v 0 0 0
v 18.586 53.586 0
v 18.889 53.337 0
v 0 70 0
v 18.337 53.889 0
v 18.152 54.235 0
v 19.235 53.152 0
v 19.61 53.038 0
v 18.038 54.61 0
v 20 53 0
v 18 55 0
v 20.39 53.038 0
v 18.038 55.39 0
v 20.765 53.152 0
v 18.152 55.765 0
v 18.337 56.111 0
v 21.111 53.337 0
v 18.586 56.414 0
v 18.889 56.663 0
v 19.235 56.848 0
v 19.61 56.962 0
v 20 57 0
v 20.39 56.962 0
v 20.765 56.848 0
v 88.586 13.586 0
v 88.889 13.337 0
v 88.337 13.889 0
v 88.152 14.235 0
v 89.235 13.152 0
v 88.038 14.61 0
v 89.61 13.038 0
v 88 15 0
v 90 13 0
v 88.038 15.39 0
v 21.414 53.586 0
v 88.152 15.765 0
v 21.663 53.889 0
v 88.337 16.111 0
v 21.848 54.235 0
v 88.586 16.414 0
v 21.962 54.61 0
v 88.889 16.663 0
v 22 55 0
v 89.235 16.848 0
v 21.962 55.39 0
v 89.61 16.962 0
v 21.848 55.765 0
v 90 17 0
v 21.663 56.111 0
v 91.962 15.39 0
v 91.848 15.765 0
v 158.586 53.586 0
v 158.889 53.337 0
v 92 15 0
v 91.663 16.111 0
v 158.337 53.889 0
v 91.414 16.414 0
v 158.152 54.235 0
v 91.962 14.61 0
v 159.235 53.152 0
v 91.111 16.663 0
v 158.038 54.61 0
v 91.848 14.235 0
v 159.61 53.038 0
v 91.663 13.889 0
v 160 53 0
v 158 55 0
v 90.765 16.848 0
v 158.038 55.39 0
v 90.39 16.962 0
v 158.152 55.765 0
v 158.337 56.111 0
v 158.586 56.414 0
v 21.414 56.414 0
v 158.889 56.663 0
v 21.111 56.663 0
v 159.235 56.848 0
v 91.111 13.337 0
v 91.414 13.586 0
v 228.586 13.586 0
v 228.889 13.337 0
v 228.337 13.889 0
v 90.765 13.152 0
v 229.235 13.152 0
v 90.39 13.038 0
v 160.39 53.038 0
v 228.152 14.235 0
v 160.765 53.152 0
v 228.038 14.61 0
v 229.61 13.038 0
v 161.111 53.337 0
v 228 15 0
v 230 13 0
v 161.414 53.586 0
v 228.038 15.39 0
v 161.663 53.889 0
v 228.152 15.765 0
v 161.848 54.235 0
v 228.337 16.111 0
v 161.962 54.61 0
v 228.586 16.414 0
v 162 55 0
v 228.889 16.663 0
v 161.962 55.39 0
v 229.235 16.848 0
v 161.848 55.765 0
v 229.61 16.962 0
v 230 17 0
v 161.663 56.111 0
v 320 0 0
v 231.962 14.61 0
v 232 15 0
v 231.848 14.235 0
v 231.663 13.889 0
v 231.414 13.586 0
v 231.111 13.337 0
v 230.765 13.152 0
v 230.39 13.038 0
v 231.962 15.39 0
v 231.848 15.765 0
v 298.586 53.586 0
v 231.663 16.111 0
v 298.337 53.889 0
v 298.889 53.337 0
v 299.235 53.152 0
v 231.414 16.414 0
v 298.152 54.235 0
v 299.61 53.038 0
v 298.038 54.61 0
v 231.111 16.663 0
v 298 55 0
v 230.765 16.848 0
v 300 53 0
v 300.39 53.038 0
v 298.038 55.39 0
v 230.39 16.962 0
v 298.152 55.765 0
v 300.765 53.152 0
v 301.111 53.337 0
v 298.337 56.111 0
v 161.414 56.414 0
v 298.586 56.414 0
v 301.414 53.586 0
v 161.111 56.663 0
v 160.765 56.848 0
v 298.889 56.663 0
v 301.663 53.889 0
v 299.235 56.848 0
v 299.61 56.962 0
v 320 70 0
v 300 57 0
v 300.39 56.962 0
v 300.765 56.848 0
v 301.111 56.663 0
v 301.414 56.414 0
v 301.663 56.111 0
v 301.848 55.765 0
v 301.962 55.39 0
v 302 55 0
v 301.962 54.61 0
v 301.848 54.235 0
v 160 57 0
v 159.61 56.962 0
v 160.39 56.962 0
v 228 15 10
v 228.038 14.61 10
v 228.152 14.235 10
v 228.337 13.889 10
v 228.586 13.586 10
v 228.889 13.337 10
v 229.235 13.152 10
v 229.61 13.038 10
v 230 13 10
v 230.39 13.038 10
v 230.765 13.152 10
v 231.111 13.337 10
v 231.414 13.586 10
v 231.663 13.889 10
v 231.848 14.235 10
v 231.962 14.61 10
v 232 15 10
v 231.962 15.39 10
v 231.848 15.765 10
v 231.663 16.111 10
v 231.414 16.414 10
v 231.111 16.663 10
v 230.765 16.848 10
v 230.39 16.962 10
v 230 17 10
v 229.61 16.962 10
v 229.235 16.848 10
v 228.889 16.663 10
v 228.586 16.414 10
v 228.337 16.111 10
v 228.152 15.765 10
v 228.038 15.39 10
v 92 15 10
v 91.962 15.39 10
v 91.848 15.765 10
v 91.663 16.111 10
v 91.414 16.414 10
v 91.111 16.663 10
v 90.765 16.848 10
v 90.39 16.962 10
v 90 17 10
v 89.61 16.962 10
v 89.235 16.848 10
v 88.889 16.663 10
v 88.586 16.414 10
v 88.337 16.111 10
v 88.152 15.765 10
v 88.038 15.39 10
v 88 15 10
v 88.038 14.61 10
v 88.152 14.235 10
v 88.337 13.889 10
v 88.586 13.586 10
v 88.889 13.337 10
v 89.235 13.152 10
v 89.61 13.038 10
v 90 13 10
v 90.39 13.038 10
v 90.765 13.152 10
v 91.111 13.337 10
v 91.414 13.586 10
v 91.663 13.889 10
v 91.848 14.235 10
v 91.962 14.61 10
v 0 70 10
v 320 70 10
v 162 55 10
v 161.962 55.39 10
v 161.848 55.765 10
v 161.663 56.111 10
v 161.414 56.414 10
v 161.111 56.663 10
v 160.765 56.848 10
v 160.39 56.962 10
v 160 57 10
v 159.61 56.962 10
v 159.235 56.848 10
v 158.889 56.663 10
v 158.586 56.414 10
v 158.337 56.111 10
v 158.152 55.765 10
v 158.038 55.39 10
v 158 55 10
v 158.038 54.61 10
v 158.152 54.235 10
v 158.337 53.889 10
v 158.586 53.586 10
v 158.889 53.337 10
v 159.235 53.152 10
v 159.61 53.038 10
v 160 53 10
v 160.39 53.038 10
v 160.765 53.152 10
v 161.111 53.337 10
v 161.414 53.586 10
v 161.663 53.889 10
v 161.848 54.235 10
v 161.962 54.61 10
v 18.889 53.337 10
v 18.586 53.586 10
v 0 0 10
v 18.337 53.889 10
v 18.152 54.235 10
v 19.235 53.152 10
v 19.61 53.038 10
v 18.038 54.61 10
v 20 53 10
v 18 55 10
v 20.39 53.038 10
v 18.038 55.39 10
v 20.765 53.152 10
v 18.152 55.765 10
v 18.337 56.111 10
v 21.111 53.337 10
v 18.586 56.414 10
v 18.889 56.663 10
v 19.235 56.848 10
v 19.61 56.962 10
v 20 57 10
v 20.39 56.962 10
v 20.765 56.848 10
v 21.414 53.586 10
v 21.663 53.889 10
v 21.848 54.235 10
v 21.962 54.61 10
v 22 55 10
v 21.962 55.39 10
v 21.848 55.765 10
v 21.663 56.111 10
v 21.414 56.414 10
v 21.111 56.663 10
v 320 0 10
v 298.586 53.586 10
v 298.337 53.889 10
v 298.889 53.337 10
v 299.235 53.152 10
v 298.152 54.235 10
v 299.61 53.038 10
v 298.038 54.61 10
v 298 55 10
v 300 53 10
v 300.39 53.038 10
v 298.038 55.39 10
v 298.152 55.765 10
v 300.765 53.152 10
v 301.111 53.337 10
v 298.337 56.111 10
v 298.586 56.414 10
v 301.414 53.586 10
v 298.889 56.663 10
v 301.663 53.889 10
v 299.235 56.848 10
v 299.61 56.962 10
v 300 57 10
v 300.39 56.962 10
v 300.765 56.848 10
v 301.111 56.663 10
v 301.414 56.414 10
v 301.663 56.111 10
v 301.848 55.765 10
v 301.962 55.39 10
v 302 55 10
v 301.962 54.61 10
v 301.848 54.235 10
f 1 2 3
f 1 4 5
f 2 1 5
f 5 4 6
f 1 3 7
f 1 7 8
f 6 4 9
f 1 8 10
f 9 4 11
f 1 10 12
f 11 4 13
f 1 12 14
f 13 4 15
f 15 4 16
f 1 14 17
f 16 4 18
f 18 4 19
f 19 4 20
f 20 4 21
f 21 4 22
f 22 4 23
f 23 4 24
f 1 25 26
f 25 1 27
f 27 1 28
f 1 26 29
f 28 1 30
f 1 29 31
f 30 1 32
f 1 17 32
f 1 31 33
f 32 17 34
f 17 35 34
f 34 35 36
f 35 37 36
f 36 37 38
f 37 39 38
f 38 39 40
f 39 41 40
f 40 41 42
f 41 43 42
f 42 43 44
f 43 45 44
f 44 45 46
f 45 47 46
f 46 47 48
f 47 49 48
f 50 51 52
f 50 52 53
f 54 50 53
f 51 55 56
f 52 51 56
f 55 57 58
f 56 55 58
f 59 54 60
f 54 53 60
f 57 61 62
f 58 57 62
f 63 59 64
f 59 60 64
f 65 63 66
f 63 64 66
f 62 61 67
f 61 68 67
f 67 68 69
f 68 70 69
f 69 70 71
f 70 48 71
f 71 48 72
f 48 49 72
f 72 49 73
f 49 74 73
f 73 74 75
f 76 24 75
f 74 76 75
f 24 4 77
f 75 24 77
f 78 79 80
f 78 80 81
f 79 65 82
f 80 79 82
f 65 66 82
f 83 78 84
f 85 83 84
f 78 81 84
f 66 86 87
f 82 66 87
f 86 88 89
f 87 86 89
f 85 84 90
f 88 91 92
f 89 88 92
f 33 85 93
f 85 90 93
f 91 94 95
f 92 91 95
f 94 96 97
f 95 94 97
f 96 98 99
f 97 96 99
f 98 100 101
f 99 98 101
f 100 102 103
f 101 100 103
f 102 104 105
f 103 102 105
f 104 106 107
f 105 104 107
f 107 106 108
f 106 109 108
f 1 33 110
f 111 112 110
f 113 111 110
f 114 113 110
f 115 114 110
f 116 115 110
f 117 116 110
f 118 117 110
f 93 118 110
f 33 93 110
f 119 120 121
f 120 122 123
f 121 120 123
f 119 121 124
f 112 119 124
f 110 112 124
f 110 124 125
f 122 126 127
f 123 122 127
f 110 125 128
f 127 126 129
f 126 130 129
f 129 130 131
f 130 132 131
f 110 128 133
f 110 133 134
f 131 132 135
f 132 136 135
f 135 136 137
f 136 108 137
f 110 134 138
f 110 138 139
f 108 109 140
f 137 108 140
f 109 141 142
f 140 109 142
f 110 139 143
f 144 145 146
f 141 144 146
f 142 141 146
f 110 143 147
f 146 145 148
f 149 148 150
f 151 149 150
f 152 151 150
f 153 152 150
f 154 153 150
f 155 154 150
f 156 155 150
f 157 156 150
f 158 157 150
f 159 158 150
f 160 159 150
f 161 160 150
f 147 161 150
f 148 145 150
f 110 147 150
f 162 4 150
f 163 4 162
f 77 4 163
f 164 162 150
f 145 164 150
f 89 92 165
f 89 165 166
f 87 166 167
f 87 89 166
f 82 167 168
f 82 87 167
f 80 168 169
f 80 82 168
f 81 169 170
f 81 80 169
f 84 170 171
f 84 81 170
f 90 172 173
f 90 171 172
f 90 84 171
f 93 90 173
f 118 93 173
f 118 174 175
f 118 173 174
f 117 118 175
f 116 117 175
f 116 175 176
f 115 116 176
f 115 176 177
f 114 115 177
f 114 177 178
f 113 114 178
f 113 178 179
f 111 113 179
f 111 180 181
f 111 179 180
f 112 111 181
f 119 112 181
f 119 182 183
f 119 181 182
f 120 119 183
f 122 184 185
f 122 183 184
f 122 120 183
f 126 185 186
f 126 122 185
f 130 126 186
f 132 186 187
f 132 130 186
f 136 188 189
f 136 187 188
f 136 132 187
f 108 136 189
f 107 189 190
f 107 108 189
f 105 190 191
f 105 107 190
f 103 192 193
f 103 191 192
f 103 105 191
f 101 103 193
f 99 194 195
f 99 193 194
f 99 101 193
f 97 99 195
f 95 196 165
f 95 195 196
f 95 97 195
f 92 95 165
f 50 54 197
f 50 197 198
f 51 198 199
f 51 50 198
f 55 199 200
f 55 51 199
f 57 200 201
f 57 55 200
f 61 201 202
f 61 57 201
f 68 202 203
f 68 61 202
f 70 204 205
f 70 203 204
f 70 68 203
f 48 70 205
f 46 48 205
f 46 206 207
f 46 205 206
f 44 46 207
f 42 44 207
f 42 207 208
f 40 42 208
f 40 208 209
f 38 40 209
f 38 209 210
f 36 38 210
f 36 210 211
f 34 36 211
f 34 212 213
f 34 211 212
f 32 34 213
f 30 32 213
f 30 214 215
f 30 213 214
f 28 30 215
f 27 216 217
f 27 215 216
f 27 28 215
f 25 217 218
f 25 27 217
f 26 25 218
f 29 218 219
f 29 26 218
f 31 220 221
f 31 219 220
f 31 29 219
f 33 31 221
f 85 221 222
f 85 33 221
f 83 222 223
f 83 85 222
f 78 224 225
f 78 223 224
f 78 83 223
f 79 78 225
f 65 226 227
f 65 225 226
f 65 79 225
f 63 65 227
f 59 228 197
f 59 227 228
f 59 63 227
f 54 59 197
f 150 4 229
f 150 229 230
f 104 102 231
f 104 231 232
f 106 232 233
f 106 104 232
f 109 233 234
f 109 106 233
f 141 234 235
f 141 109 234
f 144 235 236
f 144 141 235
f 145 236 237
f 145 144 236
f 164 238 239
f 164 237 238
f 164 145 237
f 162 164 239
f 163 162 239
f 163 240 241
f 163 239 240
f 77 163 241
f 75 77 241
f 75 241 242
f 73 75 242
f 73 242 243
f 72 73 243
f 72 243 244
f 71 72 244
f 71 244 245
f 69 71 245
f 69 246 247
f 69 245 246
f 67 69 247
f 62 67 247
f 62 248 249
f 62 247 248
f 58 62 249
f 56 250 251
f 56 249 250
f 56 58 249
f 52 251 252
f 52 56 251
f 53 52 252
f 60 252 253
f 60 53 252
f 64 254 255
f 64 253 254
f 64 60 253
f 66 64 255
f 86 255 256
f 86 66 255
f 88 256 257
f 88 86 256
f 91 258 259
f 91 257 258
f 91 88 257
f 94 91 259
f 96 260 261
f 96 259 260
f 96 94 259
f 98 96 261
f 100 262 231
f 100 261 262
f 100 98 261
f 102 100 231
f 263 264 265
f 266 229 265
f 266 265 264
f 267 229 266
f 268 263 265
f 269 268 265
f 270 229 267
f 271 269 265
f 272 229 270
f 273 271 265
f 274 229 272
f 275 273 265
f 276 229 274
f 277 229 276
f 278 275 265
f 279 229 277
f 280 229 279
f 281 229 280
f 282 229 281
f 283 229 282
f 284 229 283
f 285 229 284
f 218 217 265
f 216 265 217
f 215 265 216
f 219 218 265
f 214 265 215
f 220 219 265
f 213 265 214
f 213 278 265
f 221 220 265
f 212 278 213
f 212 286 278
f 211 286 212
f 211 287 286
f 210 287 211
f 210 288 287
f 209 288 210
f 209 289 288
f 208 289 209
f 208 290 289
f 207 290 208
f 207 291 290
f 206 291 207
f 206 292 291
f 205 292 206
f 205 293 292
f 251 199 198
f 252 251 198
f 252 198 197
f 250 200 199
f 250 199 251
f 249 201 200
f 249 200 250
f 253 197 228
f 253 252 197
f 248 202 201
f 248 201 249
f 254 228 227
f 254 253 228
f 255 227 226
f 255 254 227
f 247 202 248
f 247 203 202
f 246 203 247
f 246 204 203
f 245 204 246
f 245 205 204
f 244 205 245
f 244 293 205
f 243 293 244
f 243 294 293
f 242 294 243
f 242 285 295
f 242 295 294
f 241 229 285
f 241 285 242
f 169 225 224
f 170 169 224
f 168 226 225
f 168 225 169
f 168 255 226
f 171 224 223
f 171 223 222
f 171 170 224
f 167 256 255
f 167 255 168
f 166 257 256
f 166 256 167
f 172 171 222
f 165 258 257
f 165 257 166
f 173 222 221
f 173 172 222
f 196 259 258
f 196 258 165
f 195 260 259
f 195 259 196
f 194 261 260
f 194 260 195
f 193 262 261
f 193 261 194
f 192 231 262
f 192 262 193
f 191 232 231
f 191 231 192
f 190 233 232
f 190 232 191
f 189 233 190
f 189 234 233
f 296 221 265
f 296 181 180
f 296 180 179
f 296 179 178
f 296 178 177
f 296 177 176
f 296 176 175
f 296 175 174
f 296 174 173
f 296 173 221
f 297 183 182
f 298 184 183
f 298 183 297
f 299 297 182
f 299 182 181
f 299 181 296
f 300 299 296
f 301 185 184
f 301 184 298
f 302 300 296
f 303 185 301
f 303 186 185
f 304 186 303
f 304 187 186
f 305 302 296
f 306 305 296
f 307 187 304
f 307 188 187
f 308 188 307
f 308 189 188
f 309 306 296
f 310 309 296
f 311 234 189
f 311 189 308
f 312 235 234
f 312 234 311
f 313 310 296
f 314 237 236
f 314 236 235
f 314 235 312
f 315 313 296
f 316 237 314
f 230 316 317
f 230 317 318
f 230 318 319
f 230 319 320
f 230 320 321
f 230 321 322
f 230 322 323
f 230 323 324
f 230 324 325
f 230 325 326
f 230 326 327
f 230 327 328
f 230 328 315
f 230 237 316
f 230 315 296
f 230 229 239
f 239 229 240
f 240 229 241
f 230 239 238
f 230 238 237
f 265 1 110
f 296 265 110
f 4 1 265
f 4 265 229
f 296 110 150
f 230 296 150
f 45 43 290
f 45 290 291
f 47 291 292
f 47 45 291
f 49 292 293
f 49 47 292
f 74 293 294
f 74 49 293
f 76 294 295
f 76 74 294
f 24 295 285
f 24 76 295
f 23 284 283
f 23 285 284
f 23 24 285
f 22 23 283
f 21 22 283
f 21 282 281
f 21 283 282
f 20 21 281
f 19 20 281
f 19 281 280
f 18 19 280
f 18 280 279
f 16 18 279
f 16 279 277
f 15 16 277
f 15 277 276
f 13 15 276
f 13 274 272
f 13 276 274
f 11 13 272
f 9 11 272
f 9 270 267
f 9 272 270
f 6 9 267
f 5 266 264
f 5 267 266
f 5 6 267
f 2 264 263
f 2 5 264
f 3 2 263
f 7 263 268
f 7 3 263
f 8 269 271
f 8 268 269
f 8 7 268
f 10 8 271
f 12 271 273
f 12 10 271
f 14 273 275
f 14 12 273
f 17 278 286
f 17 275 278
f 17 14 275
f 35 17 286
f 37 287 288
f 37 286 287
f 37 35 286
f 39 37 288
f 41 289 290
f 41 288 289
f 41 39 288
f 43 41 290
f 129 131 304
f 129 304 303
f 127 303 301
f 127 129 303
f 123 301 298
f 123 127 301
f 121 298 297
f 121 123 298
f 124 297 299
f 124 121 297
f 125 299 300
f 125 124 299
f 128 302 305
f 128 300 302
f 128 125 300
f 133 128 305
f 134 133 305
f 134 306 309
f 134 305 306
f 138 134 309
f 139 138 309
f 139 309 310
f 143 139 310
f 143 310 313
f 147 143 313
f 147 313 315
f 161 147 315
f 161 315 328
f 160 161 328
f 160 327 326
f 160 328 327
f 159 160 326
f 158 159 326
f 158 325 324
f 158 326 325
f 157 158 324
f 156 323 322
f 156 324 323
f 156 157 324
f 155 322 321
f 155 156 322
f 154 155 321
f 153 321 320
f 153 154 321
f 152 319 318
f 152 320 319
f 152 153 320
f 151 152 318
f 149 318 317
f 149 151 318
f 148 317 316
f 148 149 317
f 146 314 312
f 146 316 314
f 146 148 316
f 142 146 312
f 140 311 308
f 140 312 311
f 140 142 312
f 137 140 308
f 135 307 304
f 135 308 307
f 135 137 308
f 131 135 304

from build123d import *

# Parameters (mm, degrees)
ESQUISSE1_W                  = 320
ESQUISSE1_H                  = 70
BOSS_EXTRU_1_DEPTH           = 10
ENL_V_MAT_EXTRU_1_DEPTH      = 328.719392163
ENL_V_MAT_EXTRU_1_DEPTH_BACK = 328.719392163
ESQUISSE2_R                  = 2


with BuildPart() as part:
    # Esquisse1 → Boss.-Extru.1 (new body)
    with BuildSketch(Plane.XY):
        with Locations((160, 35)):
            Rectangle(ESQUISSE1_W, ESQUISSE1_H)
    extrude(amount=BOSS_EXTRU_1_DEPTH)

    # Esquisse2 → Enlèv. mat.-Extru.1 (cut, two sides: drawn at the far end of the back side and taken through both)
    with BuildSketch(Plane.XY.offset(10).offset(-ENL_V_MAT_EXTRU_1_DEPTH_BACK)):
        with Locations((160, 55)):
            Circle(ESQUISSE2_R)
        with Locations((90, 15)):
            Circle(ESQUISSE2_R)
        with Locations((20, 55)):
            Circle(ESQUISSE2_R)
        with Locations(Location((300, 55, 0), (0, 0, 180))):
            Circle(ESQUISSE2_R)
        with Locations(Location((230, 15, 0), (0, 0, 180))):
            Circle(ESQUISSE2_R)
    extrude(amount=ENL_V_MAT_EXTRU_1_DEPTH + ENL_V_MAT_EXTRU_1_DEPTH_BACK, mode=Mode.SUBTRACT)


solid = part.part
